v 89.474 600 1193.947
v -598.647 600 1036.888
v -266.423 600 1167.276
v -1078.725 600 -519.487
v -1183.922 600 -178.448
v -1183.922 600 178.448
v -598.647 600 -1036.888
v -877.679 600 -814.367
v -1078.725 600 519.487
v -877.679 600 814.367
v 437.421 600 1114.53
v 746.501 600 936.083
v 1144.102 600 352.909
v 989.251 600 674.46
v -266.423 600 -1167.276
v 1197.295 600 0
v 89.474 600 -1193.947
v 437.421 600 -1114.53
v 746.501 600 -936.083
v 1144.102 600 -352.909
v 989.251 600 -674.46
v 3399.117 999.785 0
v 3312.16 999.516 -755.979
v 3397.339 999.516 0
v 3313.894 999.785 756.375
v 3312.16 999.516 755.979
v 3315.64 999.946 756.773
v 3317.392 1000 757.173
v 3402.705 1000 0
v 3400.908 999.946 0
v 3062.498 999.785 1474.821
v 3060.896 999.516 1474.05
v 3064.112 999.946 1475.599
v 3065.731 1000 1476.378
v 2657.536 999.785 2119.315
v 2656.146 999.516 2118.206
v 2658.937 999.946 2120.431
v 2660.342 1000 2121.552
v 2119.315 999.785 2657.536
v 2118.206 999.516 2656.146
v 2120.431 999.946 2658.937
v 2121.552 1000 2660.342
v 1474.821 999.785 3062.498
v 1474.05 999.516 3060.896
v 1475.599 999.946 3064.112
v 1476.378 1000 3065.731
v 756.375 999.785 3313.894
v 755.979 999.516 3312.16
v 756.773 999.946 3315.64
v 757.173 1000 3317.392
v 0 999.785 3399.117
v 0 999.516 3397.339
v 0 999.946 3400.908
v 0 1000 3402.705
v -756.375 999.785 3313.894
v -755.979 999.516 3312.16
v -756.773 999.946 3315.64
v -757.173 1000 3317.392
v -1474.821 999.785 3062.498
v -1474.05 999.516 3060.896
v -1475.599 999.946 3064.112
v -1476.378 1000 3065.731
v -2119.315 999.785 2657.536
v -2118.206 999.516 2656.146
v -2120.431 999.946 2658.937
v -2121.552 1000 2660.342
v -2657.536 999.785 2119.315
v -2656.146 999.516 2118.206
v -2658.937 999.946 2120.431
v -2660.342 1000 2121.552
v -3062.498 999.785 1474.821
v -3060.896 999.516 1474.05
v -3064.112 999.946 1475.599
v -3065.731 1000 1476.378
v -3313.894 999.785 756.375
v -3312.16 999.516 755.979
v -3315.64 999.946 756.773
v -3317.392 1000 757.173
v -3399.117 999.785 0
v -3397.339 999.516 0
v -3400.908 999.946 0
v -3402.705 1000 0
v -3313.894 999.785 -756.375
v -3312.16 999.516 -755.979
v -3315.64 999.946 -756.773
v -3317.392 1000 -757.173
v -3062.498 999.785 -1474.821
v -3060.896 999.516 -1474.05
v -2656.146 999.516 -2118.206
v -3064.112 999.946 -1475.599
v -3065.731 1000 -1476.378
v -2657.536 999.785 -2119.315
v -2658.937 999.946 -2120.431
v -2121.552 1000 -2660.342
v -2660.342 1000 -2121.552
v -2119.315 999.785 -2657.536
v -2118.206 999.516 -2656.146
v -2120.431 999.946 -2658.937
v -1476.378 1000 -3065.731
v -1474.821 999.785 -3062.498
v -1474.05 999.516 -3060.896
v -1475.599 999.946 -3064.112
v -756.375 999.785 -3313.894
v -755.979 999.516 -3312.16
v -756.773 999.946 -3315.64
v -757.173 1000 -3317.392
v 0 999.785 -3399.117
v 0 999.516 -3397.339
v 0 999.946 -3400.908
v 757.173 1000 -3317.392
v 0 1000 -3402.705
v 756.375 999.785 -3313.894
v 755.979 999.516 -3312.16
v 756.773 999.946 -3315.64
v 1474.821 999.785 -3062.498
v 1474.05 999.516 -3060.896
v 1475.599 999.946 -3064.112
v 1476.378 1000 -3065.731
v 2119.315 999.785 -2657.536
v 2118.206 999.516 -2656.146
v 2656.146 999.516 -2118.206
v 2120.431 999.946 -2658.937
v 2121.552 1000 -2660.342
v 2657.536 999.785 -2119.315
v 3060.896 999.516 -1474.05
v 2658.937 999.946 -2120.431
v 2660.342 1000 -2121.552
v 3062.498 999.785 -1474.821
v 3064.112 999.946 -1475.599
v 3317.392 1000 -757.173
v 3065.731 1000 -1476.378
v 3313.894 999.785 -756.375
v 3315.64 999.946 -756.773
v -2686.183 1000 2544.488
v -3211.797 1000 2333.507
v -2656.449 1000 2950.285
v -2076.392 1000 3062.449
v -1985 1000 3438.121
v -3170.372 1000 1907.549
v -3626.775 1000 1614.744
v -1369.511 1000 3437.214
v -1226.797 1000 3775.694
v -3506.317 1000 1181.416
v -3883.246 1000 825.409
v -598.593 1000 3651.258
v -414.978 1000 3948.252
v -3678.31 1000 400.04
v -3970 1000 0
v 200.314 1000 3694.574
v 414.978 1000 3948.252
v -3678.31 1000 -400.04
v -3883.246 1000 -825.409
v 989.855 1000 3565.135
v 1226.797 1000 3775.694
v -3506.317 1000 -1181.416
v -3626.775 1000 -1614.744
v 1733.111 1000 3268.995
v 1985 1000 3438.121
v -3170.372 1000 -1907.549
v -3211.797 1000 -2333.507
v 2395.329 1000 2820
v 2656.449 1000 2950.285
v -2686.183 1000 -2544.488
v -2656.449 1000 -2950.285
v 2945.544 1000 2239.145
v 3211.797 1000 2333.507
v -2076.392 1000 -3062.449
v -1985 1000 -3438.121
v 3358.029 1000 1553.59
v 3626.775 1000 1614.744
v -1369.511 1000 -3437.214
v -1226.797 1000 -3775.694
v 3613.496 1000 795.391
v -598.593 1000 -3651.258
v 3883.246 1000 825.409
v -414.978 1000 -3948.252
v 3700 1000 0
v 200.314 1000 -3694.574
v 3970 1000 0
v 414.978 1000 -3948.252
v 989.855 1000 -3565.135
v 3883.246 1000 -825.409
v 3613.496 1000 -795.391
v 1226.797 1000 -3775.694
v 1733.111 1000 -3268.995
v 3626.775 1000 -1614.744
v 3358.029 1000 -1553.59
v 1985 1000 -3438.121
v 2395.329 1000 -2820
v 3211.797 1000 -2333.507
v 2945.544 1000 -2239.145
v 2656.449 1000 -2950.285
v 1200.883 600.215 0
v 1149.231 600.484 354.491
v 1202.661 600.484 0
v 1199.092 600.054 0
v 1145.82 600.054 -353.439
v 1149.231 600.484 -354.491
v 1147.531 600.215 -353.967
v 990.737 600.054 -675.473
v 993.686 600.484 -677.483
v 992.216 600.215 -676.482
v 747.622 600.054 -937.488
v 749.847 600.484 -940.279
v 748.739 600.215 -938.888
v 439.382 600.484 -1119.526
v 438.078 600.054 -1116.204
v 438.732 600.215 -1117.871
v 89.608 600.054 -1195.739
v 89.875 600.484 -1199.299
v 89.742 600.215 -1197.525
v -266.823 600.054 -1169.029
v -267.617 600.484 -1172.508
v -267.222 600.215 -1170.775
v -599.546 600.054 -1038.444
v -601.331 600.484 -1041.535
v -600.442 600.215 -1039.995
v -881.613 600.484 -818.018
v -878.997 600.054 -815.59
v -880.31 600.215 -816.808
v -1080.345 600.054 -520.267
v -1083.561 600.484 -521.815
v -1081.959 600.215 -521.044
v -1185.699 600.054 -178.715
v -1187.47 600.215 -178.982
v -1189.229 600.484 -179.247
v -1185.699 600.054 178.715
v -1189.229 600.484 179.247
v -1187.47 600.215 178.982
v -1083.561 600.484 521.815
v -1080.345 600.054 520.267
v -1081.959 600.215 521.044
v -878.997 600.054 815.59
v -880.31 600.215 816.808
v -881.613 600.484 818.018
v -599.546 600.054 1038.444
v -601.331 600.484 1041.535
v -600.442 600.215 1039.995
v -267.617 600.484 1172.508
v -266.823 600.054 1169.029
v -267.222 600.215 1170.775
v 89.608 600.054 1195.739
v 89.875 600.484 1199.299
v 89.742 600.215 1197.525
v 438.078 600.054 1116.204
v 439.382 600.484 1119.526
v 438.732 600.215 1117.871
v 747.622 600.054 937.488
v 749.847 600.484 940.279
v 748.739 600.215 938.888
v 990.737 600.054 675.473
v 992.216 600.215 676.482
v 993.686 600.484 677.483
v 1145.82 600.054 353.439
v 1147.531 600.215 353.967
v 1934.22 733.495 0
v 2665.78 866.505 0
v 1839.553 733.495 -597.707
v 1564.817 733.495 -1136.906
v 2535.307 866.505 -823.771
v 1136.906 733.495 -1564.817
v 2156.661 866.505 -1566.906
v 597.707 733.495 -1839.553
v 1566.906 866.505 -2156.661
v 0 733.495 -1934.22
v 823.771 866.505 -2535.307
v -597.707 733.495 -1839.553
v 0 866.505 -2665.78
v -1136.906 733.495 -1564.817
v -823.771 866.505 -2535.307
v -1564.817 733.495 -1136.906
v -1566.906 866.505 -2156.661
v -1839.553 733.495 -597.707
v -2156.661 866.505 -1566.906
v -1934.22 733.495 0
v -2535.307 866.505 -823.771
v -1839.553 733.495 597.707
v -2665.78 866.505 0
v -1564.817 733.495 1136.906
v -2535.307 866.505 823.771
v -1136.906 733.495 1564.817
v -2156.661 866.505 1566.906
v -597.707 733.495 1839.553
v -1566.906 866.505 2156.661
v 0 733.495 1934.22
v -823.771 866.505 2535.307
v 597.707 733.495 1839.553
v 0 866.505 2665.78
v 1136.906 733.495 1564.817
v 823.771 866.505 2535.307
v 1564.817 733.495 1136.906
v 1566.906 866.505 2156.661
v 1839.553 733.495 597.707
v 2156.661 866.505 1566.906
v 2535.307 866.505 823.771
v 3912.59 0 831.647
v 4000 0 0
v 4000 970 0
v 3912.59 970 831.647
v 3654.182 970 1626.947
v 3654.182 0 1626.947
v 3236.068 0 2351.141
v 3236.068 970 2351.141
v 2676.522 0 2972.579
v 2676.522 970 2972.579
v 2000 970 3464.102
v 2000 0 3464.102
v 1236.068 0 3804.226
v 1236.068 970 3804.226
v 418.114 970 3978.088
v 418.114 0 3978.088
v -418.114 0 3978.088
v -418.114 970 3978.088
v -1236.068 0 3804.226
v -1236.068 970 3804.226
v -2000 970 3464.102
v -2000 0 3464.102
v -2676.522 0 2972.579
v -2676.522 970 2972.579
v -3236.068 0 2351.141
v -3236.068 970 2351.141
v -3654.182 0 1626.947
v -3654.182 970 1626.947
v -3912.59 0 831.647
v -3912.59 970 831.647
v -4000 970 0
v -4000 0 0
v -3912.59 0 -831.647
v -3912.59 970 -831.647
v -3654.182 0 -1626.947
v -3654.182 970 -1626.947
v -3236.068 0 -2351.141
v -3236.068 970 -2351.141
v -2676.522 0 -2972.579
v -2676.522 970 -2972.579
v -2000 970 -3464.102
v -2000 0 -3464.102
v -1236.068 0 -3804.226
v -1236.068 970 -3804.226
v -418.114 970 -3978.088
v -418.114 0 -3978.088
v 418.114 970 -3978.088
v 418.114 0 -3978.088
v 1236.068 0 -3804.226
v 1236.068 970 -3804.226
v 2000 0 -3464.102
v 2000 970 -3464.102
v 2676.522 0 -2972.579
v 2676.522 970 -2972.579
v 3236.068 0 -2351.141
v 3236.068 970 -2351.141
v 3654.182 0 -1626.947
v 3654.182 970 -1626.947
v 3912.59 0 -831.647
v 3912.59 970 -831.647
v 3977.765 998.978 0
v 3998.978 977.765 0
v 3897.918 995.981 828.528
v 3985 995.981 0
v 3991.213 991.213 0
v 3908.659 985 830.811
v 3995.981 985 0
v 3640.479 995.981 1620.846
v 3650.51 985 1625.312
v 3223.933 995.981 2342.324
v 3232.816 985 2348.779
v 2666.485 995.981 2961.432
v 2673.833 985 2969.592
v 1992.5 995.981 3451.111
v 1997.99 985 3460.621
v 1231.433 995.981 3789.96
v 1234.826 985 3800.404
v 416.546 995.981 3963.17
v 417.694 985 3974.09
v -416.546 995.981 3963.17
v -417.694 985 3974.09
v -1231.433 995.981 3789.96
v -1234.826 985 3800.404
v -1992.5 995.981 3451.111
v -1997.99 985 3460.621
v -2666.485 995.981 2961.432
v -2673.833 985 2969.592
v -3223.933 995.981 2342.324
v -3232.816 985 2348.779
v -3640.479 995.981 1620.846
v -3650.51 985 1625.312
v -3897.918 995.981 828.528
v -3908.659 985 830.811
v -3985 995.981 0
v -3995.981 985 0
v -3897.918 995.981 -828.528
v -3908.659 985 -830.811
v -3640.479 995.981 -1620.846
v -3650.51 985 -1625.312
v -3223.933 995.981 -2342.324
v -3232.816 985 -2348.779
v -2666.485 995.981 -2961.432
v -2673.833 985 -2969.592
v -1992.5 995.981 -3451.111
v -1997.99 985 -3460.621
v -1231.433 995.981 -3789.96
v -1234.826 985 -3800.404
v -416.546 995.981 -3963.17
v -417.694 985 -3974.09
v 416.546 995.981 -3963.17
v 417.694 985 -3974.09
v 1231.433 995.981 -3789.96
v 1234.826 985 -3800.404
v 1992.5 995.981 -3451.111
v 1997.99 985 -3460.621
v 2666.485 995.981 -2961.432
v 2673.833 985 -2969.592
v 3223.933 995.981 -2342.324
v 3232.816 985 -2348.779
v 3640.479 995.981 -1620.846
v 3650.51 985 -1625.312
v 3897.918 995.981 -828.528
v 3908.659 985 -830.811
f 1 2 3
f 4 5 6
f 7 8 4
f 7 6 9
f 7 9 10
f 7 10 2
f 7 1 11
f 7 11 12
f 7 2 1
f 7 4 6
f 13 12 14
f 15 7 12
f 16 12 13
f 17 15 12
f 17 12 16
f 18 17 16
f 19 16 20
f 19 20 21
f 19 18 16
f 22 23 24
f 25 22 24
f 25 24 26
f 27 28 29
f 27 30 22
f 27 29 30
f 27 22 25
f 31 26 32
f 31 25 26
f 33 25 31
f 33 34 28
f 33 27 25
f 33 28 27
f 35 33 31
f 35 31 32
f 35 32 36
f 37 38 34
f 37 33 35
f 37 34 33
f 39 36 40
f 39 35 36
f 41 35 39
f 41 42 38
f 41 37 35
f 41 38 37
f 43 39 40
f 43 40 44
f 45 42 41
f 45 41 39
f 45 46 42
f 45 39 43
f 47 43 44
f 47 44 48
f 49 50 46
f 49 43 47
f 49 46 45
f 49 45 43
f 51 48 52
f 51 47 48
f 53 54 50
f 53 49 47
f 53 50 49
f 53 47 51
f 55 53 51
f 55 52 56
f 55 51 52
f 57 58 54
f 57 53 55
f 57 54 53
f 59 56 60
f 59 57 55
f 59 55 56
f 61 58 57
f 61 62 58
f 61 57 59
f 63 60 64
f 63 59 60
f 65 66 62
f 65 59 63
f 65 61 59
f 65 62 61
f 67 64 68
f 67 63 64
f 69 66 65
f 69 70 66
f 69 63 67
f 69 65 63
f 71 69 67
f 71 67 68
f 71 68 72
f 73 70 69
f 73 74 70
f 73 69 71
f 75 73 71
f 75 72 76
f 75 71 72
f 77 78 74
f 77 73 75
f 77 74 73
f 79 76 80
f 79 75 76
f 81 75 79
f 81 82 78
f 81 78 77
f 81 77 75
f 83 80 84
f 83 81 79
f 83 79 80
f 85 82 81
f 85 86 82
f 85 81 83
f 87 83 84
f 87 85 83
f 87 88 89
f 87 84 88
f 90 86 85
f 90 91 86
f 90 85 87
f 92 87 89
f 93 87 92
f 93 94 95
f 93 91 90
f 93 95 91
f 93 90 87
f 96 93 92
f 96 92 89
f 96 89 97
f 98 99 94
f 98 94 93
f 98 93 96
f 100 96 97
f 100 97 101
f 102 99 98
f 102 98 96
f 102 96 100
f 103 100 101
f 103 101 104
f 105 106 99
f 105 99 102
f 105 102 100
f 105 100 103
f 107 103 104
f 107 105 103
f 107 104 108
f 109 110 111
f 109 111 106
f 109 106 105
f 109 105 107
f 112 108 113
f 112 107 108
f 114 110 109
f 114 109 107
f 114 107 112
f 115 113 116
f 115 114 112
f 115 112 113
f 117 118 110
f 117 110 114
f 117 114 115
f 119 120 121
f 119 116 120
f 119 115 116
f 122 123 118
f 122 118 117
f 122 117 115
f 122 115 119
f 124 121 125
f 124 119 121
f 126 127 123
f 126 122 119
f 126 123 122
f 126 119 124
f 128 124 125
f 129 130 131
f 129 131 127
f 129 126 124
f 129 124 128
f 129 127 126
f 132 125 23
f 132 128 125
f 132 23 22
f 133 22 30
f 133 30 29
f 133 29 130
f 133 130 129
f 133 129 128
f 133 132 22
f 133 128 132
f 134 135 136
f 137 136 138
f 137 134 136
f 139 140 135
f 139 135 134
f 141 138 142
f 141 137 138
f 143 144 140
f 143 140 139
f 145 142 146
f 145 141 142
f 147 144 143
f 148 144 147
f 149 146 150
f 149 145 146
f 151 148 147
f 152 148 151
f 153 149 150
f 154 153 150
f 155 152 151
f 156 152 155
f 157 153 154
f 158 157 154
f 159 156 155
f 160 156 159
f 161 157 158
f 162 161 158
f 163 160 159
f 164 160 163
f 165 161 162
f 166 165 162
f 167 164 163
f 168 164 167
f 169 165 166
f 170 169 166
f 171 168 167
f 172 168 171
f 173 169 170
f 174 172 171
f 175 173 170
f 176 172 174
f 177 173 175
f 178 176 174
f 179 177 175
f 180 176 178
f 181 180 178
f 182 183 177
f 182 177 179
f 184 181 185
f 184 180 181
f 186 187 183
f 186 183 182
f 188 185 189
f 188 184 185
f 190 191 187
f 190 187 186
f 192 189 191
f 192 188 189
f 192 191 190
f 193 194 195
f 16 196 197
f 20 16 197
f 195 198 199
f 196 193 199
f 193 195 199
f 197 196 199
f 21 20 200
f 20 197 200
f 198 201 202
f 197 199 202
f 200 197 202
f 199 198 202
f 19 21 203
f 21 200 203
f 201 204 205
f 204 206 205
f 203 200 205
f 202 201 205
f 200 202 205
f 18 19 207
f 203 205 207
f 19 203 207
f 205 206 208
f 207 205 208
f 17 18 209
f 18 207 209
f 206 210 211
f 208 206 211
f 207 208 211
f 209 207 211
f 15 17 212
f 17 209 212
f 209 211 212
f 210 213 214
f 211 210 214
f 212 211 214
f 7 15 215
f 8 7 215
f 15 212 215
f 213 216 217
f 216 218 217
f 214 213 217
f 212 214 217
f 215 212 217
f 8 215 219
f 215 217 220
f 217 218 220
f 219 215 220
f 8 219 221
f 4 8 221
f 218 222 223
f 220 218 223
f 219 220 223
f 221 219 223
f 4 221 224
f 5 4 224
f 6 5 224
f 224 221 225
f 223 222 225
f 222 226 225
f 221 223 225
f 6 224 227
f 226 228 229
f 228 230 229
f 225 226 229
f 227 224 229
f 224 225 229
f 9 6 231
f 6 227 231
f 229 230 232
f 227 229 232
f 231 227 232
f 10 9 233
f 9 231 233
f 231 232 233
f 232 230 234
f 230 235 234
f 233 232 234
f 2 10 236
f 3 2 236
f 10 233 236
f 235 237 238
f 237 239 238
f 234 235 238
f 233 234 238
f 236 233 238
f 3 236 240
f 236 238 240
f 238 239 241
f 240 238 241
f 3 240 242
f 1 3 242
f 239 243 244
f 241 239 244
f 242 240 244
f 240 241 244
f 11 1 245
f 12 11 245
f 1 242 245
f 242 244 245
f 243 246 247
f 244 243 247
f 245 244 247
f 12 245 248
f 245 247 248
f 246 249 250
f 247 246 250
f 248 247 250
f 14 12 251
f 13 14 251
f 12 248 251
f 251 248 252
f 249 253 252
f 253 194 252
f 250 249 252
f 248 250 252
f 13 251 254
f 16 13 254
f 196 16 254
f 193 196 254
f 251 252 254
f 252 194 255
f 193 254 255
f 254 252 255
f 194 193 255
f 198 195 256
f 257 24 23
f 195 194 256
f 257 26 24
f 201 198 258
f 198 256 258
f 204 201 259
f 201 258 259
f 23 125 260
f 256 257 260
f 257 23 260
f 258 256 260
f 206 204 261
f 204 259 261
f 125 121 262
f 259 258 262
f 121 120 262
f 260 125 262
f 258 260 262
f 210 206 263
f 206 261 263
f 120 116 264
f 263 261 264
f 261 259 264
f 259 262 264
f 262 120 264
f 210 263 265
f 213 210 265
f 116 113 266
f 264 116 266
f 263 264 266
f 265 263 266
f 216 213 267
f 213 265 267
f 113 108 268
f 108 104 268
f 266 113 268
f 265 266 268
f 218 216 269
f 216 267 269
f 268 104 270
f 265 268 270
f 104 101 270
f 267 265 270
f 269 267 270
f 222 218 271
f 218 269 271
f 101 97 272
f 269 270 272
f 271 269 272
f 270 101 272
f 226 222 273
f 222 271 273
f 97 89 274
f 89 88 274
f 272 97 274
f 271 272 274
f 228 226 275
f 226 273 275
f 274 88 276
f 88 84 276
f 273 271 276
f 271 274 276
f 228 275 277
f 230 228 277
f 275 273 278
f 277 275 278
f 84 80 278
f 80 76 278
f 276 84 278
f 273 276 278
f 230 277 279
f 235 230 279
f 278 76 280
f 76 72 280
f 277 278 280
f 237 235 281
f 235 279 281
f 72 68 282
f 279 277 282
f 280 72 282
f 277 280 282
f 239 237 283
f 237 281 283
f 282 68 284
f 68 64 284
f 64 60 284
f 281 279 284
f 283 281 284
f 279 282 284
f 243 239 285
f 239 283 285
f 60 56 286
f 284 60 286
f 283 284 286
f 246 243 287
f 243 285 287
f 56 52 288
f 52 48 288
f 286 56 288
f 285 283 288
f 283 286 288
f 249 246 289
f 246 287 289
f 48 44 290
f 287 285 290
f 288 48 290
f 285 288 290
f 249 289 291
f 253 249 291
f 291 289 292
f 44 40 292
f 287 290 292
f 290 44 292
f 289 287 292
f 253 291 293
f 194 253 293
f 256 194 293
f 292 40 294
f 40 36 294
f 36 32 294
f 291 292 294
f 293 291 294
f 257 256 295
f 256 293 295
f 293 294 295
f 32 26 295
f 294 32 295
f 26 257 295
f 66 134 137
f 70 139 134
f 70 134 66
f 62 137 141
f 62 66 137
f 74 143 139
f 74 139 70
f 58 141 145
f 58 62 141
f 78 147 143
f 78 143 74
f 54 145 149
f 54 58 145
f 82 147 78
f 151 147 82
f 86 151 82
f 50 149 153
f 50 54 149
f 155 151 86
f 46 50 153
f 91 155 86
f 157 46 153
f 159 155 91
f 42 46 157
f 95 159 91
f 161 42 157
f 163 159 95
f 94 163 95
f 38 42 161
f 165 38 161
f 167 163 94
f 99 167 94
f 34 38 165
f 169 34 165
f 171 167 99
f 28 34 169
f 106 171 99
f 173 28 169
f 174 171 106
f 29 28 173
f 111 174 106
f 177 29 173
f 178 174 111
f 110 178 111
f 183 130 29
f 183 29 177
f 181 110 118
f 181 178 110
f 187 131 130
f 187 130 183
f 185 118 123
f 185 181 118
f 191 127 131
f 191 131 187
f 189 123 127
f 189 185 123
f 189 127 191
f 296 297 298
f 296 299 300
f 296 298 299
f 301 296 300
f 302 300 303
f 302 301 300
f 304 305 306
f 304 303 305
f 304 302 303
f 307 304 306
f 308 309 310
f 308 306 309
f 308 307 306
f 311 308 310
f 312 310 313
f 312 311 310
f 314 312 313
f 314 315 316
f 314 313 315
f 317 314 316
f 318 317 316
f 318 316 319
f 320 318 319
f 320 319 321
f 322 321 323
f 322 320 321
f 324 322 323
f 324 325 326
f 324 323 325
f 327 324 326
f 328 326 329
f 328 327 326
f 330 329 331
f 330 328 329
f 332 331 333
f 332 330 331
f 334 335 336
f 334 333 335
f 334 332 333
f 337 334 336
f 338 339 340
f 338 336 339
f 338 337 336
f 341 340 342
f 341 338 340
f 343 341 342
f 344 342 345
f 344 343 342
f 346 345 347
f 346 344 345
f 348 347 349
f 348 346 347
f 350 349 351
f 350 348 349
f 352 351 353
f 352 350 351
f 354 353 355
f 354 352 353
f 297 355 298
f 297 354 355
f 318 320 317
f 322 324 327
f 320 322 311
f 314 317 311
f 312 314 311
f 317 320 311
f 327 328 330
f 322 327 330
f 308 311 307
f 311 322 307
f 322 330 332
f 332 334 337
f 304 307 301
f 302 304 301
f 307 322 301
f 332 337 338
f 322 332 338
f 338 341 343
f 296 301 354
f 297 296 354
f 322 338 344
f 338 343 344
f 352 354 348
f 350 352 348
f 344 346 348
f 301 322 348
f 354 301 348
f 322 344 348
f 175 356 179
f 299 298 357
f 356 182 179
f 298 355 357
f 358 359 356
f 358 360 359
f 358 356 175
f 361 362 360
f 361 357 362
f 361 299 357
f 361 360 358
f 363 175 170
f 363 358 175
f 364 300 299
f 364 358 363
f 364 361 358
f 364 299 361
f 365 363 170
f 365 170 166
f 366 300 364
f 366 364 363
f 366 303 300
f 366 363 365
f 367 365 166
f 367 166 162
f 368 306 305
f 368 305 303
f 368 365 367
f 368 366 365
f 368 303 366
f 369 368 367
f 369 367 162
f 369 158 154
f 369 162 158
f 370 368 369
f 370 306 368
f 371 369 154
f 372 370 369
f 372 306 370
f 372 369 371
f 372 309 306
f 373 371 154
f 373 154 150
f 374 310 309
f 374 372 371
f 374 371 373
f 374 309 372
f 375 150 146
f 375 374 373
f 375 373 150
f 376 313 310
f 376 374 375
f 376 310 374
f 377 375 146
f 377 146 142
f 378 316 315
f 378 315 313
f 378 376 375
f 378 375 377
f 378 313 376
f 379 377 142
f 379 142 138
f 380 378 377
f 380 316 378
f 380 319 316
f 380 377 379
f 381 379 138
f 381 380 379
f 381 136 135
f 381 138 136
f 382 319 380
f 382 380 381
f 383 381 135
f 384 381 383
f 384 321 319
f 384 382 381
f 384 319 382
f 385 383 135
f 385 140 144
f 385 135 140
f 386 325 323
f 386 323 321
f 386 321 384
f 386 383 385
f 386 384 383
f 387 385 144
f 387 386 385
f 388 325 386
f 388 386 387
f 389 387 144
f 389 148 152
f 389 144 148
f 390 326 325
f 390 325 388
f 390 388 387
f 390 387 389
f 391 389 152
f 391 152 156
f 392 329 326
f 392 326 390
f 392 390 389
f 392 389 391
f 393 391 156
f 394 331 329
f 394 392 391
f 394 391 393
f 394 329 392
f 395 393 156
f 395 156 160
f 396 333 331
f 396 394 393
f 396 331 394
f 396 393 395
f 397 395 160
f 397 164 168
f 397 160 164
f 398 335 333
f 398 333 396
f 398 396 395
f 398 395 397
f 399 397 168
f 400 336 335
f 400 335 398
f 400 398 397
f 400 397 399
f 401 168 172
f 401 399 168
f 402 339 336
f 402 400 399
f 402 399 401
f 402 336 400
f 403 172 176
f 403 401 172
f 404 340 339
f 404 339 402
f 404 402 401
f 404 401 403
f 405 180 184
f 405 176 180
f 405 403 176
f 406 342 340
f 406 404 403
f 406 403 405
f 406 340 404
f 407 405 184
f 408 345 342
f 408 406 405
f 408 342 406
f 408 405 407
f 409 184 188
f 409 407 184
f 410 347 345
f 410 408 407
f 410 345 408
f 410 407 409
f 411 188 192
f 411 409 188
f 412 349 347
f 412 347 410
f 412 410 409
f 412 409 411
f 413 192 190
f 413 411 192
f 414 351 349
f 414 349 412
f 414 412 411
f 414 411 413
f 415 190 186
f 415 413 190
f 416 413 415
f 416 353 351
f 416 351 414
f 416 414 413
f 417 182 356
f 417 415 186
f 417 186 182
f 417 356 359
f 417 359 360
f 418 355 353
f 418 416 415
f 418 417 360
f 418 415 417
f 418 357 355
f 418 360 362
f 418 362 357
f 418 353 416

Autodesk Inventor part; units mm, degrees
ref_plane "YZ Plane" through (0, 0, 0) normal (1, 0, 0) x (0, 1, 0)
ref_plane "XZ Plane" through (0, 0, 0) normal (0, 1, 0) x (-1, 0, 0)
ref_plane "XY Plane" through (0, 0, 0) normal (0, 0, 1) x (1, 0, 0)
sketch "Boceto1" plane through (0, 0, 0) normal (0, 0, 1) x (1, 0, 0)
  line L0 (0, 0) -> (0, 1000)
  line L1 (4000, 1000) -> (4000, 0)
  line L2 (4000, 0) -> (0, 0)
  line L3 (4000, 1000) -> (3700, 1000)
  line L4 (0, 600) -> (1200, 600)
  line L5 (3700, 1000) -> (3400, 1000)
  line L6 (3400, 1000) -> (1200, 600)
  dimension "d0" = 1000
  dimension "d1" = 4000
  dimension "d2" = 300
  dimension "d4" = 1200
  dimension "d5" = 300
revolve "Revolución1" add sketch "Boceto1" angle 360 about axis through (0, 0, 0) along (0, 1, 0)
fillet "Empalme1" radius 30 1 edges at (-1200, 600, 0)
fillet "Empalme2" radius 30 1 edges at (-3400, 1000, 0)
fillet "Empalme3" radius 30 1 edges at (-4000, 1000, 0)
properties part number "PARTE_SUPERIOR_BALSA_FLOTABILIDAD_UNIDMOTRIZVALPO"
